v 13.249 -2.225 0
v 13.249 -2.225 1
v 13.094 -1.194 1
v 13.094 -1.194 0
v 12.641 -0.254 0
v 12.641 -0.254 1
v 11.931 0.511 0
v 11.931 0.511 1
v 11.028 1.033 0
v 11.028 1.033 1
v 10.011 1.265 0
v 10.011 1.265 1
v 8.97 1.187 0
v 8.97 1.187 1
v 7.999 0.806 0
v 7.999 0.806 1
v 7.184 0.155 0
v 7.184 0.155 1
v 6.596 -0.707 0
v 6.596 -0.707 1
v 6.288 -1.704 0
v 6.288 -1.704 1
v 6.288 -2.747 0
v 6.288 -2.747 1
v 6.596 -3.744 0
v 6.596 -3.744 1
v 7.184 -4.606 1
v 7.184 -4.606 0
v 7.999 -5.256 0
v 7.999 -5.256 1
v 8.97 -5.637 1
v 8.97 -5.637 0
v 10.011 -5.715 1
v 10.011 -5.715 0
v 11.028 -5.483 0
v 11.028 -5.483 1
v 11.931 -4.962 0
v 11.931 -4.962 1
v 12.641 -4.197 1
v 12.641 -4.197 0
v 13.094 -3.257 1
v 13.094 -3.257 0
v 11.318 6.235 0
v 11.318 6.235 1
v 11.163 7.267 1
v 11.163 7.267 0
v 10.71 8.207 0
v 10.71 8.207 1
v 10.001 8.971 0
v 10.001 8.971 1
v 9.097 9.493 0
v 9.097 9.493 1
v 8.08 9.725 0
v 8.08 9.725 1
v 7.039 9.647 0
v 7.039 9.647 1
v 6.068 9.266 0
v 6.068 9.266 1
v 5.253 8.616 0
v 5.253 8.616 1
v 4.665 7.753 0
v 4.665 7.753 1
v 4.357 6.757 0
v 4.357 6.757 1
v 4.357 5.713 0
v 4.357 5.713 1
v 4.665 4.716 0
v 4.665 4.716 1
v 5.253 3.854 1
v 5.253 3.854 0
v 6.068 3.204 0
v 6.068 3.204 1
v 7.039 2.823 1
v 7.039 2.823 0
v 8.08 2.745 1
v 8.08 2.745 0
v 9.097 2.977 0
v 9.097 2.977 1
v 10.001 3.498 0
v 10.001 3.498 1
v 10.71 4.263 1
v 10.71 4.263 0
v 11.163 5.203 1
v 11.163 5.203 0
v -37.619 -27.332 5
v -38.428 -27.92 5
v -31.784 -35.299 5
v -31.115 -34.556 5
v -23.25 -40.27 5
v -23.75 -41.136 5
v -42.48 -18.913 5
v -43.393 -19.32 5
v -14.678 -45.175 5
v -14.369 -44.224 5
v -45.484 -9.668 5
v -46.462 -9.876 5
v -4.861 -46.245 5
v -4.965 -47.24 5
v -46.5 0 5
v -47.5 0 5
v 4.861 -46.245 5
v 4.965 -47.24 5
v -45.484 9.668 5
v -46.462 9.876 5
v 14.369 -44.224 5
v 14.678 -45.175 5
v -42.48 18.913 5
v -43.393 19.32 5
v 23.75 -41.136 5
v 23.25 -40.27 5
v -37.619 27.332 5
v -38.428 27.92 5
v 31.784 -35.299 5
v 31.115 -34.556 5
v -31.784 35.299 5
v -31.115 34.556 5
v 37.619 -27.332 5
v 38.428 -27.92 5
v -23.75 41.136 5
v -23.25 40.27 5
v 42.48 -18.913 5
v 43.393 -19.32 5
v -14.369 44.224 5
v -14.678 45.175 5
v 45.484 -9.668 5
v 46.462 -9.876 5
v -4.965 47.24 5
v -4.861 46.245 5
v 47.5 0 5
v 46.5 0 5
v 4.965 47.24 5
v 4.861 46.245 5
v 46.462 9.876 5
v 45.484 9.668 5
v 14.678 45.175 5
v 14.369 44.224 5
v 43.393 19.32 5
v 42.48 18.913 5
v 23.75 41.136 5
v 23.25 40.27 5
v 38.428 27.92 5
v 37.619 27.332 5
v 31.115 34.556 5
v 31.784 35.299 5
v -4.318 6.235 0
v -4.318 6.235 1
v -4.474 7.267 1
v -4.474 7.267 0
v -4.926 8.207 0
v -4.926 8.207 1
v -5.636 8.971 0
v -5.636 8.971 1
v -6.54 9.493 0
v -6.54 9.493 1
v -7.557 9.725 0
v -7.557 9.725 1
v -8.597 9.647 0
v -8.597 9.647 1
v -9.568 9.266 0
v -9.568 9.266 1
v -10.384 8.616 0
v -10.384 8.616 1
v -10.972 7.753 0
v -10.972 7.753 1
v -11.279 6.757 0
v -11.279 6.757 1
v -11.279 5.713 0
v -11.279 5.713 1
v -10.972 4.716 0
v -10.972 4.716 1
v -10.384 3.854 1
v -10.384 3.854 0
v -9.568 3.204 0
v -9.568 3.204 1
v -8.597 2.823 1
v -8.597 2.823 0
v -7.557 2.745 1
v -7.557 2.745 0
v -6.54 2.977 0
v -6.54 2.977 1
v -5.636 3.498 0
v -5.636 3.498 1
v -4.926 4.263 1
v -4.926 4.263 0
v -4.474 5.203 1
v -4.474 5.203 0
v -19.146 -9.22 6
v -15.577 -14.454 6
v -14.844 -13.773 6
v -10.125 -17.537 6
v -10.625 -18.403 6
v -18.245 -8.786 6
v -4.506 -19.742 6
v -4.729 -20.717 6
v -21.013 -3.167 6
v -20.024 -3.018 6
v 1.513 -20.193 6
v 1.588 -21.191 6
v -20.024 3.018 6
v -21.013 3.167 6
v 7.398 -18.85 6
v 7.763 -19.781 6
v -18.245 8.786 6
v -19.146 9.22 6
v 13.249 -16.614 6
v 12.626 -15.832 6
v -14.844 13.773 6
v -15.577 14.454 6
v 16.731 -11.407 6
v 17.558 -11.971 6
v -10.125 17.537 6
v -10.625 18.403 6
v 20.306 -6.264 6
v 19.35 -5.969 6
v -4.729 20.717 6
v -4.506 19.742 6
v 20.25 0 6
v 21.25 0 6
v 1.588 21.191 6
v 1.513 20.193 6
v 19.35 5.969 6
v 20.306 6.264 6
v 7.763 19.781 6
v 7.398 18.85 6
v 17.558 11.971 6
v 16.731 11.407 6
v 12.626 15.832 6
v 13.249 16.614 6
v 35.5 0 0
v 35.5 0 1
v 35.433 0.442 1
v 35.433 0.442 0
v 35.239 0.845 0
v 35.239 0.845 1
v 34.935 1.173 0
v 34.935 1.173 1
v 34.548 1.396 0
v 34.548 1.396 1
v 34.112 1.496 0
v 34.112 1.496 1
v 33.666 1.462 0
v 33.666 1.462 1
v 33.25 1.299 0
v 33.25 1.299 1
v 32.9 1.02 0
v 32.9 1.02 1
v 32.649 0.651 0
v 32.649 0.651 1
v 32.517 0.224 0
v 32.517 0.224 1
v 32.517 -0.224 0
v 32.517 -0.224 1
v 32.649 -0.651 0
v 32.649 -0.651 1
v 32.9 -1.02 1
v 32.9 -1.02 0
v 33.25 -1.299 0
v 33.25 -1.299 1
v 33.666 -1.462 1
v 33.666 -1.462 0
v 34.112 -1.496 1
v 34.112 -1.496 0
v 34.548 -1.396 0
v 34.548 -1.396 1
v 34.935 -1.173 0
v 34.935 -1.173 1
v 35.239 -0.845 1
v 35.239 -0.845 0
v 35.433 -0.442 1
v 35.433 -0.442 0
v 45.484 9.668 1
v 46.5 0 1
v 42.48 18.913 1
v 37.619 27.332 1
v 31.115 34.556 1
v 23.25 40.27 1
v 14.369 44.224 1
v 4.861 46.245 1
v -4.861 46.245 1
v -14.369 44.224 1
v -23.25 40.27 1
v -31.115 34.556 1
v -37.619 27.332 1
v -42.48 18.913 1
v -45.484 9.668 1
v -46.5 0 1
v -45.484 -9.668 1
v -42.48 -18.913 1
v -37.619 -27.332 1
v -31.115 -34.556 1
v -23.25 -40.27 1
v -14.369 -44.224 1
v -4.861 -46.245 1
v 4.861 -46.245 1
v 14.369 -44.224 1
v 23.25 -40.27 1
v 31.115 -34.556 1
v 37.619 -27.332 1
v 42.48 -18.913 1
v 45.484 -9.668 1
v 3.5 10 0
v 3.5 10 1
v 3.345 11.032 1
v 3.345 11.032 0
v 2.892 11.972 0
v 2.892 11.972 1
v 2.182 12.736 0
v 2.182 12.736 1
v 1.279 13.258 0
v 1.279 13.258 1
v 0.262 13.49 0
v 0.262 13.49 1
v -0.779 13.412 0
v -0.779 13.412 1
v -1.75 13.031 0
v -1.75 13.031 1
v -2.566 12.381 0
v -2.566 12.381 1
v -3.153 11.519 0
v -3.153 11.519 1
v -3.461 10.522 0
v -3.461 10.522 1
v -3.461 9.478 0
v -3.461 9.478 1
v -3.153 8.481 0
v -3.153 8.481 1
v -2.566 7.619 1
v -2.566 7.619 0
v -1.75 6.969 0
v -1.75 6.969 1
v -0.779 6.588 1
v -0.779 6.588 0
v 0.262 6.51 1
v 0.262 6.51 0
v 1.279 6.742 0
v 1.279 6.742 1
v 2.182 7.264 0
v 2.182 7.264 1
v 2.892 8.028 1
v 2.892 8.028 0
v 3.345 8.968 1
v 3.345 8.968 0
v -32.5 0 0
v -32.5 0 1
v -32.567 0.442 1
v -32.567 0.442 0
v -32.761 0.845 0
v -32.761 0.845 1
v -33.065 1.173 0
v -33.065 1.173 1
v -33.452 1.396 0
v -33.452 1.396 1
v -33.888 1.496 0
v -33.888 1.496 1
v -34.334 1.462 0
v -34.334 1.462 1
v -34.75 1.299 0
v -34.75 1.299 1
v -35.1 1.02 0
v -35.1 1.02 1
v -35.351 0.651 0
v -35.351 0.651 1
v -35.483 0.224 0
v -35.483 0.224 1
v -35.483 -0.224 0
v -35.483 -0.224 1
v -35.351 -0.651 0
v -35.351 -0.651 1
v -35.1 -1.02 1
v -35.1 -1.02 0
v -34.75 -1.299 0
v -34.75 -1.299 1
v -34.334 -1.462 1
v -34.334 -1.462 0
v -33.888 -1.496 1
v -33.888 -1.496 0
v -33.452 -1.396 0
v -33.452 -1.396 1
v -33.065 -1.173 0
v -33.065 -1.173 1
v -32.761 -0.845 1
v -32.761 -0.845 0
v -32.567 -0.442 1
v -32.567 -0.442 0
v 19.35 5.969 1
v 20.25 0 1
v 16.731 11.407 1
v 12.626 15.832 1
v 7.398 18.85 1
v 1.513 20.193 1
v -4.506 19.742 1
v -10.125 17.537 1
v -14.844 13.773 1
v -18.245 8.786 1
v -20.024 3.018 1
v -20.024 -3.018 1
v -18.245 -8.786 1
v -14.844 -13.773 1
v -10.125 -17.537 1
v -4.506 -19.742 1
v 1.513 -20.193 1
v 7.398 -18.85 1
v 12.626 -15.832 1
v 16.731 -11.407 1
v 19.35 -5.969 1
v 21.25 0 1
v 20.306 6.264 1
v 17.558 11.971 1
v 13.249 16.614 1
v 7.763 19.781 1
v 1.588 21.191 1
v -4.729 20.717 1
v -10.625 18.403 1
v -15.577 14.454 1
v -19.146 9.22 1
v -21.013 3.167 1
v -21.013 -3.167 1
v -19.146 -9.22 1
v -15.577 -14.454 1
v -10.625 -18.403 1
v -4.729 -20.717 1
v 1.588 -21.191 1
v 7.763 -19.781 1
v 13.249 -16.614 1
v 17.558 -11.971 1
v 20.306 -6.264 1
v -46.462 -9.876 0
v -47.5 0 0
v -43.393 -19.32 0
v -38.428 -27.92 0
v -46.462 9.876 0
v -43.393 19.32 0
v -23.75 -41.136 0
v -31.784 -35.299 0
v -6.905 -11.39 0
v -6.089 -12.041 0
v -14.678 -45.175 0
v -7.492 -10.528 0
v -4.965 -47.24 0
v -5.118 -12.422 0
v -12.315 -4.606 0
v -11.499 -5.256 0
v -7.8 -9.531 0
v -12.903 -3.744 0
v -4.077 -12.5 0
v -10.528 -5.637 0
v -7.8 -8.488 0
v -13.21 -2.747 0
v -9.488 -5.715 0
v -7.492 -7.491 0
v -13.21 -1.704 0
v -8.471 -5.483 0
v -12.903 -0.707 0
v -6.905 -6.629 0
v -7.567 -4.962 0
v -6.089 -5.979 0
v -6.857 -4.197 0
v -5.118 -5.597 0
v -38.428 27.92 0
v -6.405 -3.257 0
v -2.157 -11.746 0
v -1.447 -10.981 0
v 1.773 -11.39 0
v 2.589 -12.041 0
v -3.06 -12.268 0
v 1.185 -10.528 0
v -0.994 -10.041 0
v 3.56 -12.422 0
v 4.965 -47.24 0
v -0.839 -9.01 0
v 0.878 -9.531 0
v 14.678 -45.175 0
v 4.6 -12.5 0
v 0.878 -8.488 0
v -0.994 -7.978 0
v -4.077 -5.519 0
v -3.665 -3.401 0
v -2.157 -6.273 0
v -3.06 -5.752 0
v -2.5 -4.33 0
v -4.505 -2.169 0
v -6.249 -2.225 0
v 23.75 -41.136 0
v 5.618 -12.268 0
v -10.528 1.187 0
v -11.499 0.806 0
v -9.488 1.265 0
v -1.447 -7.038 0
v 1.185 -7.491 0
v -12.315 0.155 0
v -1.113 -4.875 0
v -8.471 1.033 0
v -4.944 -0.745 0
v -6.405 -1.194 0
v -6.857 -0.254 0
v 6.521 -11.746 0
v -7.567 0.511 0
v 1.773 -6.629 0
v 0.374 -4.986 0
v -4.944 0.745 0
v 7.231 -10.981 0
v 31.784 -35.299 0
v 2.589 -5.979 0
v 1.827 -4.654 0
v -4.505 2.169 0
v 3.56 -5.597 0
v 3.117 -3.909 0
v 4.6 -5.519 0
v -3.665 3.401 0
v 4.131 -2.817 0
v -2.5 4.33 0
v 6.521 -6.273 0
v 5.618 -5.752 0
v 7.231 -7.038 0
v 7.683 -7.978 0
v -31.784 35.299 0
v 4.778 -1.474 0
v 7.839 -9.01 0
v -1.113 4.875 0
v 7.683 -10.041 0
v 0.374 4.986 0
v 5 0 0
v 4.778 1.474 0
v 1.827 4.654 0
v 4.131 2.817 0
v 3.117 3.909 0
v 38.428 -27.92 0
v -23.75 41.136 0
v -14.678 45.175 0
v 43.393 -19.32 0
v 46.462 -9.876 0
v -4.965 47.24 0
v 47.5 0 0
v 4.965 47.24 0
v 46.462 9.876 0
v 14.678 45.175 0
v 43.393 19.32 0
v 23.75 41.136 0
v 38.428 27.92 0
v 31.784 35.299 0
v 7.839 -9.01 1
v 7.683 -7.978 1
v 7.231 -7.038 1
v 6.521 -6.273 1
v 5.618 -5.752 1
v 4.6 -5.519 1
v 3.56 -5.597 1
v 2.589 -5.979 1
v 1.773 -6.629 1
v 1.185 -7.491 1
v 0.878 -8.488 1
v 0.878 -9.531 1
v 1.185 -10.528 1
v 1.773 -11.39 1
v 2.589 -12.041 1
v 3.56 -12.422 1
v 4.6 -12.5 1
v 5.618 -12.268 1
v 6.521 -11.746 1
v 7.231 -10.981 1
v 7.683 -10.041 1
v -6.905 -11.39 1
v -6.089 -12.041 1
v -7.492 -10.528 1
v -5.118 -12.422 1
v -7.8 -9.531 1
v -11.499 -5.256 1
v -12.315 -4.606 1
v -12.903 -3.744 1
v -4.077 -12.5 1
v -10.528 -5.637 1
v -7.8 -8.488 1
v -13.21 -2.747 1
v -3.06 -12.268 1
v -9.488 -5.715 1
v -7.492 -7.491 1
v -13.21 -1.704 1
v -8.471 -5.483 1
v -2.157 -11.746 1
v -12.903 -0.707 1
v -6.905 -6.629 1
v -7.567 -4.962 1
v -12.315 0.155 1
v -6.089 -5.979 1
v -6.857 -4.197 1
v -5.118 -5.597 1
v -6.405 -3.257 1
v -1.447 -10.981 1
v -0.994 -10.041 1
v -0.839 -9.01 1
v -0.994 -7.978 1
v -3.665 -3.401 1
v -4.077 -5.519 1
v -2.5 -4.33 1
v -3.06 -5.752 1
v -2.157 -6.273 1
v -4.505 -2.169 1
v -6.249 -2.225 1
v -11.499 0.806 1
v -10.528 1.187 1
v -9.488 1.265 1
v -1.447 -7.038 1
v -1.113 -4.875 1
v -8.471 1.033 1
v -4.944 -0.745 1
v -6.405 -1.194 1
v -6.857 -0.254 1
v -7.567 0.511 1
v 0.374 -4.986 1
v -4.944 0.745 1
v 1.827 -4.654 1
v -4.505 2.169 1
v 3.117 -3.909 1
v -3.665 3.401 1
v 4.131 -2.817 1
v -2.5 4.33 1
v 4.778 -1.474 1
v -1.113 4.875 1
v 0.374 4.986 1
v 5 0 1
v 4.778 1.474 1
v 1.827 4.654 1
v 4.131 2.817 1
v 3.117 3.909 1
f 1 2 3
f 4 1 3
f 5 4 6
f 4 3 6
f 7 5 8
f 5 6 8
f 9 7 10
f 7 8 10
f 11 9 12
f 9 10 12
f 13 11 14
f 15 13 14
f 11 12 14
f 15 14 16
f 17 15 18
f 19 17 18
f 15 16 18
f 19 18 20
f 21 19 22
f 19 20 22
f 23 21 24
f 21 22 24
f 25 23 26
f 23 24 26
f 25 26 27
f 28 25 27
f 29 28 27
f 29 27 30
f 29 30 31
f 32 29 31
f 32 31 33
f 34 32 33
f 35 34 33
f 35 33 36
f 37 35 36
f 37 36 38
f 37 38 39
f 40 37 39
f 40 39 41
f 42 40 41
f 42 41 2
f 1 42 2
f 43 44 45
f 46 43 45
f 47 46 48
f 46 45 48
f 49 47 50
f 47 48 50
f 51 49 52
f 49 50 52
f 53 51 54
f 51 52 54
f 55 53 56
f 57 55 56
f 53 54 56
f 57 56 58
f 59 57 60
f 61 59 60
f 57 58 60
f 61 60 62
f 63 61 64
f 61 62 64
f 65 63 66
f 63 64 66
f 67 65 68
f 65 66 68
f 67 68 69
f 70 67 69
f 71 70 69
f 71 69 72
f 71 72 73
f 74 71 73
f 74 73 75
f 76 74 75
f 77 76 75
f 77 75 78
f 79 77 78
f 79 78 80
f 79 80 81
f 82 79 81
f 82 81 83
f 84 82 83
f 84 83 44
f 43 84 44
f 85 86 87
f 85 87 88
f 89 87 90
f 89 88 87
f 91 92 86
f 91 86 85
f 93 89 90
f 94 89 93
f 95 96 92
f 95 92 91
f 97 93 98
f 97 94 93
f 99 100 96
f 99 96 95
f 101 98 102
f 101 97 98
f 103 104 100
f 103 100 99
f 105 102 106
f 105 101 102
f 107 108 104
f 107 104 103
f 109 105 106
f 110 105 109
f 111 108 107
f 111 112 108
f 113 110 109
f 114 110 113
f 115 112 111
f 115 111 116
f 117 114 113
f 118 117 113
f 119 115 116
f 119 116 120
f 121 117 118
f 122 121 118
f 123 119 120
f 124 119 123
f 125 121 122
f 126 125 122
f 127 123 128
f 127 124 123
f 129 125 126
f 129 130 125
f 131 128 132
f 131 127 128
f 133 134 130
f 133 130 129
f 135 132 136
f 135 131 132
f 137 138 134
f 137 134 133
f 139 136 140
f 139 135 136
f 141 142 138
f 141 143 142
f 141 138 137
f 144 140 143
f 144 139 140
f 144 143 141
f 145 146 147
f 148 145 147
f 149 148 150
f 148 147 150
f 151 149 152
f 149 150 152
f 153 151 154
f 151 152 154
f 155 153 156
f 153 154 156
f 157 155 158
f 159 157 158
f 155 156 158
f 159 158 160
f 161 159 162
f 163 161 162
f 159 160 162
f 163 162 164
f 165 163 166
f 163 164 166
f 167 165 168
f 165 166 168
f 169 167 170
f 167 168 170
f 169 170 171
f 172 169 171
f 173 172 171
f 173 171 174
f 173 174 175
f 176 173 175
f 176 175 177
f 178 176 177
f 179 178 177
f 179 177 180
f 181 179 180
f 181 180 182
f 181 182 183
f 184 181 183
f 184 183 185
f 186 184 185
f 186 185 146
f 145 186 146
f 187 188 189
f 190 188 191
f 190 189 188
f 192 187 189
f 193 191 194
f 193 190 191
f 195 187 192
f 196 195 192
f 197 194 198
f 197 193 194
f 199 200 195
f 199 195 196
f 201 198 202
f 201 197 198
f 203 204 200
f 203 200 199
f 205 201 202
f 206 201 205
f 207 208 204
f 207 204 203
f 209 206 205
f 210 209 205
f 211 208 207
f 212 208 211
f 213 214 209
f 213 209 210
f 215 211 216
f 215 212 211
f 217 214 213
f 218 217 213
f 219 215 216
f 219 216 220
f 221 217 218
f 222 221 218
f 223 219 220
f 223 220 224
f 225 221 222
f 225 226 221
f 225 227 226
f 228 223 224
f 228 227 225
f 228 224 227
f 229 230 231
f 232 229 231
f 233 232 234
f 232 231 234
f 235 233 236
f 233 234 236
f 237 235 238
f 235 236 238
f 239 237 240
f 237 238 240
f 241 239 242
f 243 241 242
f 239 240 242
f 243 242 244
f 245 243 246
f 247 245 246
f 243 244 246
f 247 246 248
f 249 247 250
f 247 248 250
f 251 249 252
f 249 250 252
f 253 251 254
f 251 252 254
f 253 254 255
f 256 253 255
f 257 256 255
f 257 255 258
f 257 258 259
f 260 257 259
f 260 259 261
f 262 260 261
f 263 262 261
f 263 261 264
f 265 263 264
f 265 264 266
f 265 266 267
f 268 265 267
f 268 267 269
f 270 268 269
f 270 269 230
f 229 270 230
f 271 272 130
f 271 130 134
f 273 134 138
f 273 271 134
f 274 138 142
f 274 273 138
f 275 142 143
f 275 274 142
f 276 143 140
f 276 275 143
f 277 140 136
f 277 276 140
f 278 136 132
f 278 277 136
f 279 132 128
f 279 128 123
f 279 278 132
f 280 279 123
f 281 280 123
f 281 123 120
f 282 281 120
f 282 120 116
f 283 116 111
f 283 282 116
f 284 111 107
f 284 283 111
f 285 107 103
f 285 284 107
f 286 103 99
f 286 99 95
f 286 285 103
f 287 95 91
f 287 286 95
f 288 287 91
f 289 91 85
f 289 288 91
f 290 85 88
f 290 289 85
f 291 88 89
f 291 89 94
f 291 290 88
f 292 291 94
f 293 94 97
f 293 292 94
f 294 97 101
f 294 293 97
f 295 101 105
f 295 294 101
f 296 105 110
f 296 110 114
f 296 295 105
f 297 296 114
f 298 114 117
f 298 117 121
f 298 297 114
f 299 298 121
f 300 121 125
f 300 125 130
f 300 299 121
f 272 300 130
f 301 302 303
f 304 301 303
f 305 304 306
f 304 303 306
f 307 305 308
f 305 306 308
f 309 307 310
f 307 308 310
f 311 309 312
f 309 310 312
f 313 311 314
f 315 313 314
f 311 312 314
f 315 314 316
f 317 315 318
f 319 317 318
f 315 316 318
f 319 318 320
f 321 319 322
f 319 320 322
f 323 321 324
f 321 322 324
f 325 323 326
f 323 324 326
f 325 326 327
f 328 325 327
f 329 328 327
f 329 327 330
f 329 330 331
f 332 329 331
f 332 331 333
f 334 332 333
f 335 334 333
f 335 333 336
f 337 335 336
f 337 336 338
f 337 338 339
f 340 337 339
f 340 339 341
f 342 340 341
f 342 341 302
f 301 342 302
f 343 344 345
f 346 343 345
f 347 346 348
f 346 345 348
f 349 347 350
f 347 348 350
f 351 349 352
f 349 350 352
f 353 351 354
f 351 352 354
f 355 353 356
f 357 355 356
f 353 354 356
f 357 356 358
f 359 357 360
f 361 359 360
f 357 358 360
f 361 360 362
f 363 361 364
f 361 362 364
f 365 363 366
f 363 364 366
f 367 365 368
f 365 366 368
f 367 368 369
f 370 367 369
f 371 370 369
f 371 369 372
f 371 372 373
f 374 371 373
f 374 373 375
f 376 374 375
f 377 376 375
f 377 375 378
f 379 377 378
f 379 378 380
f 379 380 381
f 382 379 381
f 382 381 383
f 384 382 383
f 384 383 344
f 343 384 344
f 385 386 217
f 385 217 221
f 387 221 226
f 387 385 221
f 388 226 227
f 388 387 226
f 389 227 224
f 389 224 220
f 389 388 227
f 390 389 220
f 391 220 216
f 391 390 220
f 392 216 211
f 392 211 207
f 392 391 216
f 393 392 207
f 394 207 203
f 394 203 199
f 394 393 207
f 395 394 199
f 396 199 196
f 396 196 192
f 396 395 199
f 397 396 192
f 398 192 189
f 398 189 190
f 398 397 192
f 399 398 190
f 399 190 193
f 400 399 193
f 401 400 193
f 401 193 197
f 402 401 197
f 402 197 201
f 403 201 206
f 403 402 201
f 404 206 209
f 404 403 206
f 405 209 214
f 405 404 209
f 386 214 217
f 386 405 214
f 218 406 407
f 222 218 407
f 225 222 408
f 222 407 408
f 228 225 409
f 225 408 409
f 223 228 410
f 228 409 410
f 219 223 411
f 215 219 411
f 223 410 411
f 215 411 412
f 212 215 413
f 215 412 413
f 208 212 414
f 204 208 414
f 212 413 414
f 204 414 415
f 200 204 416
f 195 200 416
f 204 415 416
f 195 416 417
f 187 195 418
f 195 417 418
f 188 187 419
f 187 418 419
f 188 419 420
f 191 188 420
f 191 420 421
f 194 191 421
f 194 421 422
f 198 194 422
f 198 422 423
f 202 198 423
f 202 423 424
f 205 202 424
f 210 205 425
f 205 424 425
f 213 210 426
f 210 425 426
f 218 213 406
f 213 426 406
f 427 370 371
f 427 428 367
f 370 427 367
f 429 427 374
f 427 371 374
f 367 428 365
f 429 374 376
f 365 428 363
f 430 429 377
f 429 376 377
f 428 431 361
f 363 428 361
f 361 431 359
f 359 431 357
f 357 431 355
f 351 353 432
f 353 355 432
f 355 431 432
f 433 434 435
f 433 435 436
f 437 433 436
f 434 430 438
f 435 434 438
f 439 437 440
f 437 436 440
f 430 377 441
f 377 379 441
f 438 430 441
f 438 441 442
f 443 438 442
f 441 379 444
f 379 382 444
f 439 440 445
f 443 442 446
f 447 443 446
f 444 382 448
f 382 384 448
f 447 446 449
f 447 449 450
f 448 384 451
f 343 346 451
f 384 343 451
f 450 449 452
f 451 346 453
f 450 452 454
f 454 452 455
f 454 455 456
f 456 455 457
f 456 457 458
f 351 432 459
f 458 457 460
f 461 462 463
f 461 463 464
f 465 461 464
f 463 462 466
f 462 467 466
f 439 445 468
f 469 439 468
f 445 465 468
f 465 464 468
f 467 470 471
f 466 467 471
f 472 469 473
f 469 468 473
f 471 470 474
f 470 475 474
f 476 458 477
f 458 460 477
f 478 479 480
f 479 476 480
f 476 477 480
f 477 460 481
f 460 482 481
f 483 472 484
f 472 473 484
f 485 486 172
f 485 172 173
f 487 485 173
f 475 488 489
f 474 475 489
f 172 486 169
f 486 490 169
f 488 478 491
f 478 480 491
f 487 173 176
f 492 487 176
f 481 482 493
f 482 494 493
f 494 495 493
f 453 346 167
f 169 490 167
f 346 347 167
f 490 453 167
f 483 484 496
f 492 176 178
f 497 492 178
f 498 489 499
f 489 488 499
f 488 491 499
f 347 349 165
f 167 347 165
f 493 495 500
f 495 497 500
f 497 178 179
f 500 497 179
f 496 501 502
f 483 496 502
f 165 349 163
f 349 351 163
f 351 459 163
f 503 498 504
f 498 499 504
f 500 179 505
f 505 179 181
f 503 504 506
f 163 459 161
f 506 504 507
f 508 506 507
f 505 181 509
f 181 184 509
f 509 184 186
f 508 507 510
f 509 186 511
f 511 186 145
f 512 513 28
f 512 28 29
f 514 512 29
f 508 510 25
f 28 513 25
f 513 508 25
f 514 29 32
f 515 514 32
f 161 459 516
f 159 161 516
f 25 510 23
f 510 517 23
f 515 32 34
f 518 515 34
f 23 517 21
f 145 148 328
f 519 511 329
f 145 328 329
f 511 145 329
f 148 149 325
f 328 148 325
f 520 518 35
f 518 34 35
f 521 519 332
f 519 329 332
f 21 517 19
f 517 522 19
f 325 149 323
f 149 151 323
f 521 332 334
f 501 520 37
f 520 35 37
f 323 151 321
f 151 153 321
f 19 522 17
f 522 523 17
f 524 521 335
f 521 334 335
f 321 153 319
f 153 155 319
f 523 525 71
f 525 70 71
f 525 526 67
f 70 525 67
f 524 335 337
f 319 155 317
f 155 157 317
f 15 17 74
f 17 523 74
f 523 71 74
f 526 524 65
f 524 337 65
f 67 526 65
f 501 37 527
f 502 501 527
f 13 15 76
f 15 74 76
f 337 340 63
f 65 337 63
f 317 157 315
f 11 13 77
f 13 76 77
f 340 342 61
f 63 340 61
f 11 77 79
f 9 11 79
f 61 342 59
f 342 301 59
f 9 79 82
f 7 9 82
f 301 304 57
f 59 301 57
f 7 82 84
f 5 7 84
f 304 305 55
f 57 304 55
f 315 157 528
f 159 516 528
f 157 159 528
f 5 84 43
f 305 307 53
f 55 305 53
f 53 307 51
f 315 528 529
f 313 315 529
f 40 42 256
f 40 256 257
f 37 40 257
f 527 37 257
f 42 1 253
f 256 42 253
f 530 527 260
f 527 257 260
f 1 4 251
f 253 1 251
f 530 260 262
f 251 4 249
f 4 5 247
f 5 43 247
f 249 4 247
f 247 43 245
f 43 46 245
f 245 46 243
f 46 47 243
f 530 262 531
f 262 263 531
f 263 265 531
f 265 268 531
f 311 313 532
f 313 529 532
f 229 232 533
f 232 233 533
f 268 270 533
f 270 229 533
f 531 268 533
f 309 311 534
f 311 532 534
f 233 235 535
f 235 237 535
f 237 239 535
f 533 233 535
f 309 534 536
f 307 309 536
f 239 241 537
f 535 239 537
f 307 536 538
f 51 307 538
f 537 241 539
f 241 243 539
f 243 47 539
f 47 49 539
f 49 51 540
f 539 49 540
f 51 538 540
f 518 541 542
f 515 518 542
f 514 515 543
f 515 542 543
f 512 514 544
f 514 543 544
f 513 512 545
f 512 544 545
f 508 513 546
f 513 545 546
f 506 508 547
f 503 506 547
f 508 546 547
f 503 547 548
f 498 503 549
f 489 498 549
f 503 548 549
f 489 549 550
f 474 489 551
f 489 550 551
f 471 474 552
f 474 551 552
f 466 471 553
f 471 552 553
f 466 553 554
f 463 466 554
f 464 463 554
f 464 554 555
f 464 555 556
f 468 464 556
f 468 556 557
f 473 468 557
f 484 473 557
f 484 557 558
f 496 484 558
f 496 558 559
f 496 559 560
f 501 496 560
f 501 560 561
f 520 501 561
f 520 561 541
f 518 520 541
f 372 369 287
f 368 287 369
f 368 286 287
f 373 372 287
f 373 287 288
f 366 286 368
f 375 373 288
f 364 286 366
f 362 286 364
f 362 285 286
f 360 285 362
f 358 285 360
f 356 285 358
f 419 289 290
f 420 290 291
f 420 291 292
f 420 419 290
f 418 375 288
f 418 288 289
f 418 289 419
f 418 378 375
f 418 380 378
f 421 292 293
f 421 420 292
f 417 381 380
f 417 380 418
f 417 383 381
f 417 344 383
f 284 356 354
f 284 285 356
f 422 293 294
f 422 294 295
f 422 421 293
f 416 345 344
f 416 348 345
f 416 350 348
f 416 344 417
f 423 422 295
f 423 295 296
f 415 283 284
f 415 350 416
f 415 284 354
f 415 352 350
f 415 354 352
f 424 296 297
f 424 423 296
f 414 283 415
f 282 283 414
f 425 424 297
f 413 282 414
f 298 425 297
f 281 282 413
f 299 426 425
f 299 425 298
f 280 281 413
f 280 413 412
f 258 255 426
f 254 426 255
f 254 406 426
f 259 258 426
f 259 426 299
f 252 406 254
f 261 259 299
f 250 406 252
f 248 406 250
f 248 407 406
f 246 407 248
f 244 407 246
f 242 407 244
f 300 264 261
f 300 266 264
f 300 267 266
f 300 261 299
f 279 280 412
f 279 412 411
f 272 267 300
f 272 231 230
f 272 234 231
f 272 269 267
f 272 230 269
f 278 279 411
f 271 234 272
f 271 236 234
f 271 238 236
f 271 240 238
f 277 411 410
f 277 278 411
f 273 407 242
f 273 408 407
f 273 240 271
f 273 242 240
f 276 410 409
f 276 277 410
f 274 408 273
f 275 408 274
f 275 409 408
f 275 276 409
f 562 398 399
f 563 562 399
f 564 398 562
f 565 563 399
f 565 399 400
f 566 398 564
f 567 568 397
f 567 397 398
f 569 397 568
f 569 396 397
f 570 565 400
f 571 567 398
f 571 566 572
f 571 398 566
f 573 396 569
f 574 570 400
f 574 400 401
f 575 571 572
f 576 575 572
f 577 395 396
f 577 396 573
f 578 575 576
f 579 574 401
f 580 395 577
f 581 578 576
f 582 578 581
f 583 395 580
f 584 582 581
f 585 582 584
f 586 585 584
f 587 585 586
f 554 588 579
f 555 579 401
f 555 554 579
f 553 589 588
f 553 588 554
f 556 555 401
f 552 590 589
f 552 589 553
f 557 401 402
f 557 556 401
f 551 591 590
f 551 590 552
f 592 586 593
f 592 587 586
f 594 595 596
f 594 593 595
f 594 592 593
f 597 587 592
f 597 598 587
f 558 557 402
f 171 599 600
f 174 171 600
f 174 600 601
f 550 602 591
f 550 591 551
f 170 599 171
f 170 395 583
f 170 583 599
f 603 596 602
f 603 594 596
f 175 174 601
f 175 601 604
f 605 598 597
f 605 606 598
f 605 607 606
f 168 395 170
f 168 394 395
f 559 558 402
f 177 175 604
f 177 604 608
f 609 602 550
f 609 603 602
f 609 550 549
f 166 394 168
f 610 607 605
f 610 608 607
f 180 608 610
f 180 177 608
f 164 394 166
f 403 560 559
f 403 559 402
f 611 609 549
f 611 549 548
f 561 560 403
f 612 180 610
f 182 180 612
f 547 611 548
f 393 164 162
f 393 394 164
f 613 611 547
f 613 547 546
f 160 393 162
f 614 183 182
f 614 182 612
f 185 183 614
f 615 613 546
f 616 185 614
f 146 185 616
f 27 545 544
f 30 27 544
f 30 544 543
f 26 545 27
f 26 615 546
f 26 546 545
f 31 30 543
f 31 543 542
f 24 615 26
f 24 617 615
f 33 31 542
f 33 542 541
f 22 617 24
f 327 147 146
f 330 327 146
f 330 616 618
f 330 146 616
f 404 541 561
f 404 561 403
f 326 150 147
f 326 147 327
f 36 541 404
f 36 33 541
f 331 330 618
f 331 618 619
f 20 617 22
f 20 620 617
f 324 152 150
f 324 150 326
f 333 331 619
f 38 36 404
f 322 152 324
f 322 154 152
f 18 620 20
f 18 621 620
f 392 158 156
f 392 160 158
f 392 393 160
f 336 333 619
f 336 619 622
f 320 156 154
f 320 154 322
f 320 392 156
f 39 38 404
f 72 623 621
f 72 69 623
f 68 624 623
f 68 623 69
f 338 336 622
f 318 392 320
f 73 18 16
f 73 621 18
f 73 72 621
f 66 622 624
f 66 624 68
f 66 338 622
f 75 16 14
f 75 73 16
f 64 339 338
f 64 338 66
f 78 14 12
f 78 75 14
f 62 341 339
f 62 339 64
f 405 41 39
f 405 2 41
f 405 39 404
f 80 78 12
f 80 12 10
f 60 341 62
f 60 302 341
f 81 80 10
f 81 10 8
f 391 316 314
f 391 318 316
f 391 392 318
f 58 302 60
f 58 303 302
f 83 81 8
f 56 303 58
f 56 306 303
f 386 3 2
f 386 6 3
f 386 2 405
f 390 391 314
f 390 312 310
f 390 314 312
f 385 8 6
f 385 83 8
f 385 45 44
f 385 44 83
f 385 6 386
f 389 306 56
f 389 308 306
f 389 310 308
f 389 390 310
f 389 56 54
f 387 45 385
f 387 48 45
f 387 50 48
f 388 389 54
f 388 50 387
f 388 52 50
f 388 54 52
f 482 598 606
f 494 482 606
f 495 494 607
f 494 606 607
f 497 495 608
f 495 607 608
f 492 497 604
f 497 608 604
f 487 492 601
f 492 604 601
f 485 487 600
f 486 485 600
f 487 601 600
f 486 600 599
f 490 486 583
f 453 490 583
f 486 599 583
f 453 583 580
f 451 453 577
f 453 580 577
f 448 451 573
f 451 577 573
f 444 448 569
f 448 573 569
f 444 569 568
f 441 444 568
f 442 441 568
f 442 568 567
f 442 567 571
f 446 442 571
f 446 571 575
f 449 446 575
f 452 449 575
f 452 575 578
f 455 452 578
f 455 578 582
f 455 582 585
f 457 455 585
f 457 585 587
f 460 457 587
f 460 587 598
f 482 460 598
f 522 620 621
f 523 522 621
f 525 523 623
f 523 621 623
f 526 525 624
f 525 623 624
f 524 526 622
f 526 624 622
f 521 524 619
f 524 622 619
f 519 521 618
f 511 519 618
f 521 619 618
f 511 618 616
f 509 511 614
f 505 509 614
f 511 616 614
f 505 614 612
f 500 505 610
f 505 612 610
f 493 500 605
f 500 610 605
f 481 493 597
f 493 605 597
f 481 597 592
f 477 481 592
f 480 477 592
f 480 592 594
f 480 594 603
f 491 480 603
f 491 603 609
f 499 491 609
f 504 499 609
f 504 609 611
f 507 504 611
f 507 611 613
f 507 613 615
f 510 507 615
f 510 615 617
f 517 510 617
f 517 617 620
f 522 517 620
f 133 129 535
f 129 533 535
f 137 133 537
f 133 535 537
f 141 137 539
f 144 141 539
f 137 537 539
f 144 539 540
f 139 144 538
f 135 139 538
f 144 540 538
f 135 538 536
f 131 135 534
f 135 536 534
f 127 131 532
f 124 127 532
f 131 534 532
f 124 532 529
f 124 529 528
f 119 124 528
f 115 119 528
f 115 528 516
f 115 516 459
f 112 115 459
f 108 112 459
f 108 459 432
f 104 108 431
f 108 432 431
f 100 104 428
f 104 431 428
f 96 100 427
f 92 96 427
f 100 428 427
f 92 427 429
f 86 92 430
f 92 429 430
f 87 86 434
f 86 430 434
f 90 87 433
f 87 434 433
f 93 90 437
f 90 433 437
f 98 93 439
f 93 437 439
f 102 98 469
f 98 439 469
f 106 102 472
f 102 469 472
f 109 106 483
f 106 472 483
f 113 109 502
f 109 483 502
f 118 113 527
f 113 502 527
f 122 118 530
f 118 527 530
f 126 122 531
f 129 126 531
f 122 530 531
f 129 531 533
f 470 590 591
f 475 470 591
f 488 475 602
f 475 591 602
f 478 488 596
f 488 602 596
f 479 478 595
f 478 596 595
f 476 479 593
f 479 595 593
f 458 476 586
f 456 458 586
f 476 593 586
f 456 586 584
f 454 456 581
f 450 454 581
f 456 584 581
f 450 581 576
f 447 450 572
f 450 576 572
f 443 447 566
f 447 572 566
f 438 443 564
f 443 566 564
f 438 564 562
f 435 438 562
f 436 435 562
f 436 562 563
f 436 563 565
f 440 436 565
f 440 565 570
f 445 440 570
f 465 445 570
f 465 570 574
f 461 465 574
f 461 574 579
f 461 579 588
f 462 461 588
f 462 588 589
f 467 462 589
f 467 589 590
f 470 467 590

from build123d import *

# Parameters (mm, degrees)
F0_R     = 47.5
F1_DEPTH = 1
F2_R     = 47.5
F2_R_2   = 46.5
F3_DEPTH = 4
F4_R     = 21.25
F4_R_2   = 20.25
F5_DEPTH = 5
F6_R     = 3.5
F6_R_2   = 5
F7_DEPTH = 25
F8_R     = 1.5
F9_DEPTH = 25


with BuildPart() as f1:
    # F0 (on Top) → F1 (new body)
    with BuildSketch(Plane.XY):
        Circle(F0_R)
    extrude(amount=F1_DEPTH)

    # F2 (on face) → F3 (join)
    with BuildSketch(Plane.XY.offset(1)):
        Circle(F2_R)
        Circle(F2_R_2, mode=Mode.SUBTRACT)
    extrude(amount=F3_DEPTH)

    # F4 (on face) → F5 (join)
    with BuildSketch(Plane.XY.offset(1)):
        Circle(F4_R)
        Circle(F4_R_2, mode=Mode.SUBTRACT)
    extrude(amount=F5_DEPTH)

    # F6 (on face) → F7 (cut)
    with BuildSketch(Plane.XY.offset(1)):
        with Locations((-7.818315, 6.234898)):
            Circle(F6_R)
        with Locations((-9.749279, -2.225209)):
            Circle(F6_R)
        with Locations((-4.338837, -9.009689)):
            Circle(F6_R)
        with Locations((4.338837, -9.009689)):
            Circle(F6_R)
        with Locations((9.749279, -2.225209)):
            Circle(F6_R)
        with Locations((7.818315, 6.234898)):
            Circle(F6_R)
        with Locations((0, 10)):
            Circle(F6_R)
        Circle(F6_R_2)
    extrude(amount=-F7_DEPTH, mode=Mode.SUBTRACT)

    # F8 (on face) → F9 (cut)
    with BuildSketch(Plane.XY.offset(1)):
        with Locations((-34, 0)):
            Circle(F8_R)
        with Locations((34, 0)):
            Circle(F8_R)
    extrude(amount=-F9_DEPTH, mode=Mode.SUBTRACT)


with BuildPart() as f10_1:
    # F10: copy of F1
    add(f1.part)


solid = f1.part
